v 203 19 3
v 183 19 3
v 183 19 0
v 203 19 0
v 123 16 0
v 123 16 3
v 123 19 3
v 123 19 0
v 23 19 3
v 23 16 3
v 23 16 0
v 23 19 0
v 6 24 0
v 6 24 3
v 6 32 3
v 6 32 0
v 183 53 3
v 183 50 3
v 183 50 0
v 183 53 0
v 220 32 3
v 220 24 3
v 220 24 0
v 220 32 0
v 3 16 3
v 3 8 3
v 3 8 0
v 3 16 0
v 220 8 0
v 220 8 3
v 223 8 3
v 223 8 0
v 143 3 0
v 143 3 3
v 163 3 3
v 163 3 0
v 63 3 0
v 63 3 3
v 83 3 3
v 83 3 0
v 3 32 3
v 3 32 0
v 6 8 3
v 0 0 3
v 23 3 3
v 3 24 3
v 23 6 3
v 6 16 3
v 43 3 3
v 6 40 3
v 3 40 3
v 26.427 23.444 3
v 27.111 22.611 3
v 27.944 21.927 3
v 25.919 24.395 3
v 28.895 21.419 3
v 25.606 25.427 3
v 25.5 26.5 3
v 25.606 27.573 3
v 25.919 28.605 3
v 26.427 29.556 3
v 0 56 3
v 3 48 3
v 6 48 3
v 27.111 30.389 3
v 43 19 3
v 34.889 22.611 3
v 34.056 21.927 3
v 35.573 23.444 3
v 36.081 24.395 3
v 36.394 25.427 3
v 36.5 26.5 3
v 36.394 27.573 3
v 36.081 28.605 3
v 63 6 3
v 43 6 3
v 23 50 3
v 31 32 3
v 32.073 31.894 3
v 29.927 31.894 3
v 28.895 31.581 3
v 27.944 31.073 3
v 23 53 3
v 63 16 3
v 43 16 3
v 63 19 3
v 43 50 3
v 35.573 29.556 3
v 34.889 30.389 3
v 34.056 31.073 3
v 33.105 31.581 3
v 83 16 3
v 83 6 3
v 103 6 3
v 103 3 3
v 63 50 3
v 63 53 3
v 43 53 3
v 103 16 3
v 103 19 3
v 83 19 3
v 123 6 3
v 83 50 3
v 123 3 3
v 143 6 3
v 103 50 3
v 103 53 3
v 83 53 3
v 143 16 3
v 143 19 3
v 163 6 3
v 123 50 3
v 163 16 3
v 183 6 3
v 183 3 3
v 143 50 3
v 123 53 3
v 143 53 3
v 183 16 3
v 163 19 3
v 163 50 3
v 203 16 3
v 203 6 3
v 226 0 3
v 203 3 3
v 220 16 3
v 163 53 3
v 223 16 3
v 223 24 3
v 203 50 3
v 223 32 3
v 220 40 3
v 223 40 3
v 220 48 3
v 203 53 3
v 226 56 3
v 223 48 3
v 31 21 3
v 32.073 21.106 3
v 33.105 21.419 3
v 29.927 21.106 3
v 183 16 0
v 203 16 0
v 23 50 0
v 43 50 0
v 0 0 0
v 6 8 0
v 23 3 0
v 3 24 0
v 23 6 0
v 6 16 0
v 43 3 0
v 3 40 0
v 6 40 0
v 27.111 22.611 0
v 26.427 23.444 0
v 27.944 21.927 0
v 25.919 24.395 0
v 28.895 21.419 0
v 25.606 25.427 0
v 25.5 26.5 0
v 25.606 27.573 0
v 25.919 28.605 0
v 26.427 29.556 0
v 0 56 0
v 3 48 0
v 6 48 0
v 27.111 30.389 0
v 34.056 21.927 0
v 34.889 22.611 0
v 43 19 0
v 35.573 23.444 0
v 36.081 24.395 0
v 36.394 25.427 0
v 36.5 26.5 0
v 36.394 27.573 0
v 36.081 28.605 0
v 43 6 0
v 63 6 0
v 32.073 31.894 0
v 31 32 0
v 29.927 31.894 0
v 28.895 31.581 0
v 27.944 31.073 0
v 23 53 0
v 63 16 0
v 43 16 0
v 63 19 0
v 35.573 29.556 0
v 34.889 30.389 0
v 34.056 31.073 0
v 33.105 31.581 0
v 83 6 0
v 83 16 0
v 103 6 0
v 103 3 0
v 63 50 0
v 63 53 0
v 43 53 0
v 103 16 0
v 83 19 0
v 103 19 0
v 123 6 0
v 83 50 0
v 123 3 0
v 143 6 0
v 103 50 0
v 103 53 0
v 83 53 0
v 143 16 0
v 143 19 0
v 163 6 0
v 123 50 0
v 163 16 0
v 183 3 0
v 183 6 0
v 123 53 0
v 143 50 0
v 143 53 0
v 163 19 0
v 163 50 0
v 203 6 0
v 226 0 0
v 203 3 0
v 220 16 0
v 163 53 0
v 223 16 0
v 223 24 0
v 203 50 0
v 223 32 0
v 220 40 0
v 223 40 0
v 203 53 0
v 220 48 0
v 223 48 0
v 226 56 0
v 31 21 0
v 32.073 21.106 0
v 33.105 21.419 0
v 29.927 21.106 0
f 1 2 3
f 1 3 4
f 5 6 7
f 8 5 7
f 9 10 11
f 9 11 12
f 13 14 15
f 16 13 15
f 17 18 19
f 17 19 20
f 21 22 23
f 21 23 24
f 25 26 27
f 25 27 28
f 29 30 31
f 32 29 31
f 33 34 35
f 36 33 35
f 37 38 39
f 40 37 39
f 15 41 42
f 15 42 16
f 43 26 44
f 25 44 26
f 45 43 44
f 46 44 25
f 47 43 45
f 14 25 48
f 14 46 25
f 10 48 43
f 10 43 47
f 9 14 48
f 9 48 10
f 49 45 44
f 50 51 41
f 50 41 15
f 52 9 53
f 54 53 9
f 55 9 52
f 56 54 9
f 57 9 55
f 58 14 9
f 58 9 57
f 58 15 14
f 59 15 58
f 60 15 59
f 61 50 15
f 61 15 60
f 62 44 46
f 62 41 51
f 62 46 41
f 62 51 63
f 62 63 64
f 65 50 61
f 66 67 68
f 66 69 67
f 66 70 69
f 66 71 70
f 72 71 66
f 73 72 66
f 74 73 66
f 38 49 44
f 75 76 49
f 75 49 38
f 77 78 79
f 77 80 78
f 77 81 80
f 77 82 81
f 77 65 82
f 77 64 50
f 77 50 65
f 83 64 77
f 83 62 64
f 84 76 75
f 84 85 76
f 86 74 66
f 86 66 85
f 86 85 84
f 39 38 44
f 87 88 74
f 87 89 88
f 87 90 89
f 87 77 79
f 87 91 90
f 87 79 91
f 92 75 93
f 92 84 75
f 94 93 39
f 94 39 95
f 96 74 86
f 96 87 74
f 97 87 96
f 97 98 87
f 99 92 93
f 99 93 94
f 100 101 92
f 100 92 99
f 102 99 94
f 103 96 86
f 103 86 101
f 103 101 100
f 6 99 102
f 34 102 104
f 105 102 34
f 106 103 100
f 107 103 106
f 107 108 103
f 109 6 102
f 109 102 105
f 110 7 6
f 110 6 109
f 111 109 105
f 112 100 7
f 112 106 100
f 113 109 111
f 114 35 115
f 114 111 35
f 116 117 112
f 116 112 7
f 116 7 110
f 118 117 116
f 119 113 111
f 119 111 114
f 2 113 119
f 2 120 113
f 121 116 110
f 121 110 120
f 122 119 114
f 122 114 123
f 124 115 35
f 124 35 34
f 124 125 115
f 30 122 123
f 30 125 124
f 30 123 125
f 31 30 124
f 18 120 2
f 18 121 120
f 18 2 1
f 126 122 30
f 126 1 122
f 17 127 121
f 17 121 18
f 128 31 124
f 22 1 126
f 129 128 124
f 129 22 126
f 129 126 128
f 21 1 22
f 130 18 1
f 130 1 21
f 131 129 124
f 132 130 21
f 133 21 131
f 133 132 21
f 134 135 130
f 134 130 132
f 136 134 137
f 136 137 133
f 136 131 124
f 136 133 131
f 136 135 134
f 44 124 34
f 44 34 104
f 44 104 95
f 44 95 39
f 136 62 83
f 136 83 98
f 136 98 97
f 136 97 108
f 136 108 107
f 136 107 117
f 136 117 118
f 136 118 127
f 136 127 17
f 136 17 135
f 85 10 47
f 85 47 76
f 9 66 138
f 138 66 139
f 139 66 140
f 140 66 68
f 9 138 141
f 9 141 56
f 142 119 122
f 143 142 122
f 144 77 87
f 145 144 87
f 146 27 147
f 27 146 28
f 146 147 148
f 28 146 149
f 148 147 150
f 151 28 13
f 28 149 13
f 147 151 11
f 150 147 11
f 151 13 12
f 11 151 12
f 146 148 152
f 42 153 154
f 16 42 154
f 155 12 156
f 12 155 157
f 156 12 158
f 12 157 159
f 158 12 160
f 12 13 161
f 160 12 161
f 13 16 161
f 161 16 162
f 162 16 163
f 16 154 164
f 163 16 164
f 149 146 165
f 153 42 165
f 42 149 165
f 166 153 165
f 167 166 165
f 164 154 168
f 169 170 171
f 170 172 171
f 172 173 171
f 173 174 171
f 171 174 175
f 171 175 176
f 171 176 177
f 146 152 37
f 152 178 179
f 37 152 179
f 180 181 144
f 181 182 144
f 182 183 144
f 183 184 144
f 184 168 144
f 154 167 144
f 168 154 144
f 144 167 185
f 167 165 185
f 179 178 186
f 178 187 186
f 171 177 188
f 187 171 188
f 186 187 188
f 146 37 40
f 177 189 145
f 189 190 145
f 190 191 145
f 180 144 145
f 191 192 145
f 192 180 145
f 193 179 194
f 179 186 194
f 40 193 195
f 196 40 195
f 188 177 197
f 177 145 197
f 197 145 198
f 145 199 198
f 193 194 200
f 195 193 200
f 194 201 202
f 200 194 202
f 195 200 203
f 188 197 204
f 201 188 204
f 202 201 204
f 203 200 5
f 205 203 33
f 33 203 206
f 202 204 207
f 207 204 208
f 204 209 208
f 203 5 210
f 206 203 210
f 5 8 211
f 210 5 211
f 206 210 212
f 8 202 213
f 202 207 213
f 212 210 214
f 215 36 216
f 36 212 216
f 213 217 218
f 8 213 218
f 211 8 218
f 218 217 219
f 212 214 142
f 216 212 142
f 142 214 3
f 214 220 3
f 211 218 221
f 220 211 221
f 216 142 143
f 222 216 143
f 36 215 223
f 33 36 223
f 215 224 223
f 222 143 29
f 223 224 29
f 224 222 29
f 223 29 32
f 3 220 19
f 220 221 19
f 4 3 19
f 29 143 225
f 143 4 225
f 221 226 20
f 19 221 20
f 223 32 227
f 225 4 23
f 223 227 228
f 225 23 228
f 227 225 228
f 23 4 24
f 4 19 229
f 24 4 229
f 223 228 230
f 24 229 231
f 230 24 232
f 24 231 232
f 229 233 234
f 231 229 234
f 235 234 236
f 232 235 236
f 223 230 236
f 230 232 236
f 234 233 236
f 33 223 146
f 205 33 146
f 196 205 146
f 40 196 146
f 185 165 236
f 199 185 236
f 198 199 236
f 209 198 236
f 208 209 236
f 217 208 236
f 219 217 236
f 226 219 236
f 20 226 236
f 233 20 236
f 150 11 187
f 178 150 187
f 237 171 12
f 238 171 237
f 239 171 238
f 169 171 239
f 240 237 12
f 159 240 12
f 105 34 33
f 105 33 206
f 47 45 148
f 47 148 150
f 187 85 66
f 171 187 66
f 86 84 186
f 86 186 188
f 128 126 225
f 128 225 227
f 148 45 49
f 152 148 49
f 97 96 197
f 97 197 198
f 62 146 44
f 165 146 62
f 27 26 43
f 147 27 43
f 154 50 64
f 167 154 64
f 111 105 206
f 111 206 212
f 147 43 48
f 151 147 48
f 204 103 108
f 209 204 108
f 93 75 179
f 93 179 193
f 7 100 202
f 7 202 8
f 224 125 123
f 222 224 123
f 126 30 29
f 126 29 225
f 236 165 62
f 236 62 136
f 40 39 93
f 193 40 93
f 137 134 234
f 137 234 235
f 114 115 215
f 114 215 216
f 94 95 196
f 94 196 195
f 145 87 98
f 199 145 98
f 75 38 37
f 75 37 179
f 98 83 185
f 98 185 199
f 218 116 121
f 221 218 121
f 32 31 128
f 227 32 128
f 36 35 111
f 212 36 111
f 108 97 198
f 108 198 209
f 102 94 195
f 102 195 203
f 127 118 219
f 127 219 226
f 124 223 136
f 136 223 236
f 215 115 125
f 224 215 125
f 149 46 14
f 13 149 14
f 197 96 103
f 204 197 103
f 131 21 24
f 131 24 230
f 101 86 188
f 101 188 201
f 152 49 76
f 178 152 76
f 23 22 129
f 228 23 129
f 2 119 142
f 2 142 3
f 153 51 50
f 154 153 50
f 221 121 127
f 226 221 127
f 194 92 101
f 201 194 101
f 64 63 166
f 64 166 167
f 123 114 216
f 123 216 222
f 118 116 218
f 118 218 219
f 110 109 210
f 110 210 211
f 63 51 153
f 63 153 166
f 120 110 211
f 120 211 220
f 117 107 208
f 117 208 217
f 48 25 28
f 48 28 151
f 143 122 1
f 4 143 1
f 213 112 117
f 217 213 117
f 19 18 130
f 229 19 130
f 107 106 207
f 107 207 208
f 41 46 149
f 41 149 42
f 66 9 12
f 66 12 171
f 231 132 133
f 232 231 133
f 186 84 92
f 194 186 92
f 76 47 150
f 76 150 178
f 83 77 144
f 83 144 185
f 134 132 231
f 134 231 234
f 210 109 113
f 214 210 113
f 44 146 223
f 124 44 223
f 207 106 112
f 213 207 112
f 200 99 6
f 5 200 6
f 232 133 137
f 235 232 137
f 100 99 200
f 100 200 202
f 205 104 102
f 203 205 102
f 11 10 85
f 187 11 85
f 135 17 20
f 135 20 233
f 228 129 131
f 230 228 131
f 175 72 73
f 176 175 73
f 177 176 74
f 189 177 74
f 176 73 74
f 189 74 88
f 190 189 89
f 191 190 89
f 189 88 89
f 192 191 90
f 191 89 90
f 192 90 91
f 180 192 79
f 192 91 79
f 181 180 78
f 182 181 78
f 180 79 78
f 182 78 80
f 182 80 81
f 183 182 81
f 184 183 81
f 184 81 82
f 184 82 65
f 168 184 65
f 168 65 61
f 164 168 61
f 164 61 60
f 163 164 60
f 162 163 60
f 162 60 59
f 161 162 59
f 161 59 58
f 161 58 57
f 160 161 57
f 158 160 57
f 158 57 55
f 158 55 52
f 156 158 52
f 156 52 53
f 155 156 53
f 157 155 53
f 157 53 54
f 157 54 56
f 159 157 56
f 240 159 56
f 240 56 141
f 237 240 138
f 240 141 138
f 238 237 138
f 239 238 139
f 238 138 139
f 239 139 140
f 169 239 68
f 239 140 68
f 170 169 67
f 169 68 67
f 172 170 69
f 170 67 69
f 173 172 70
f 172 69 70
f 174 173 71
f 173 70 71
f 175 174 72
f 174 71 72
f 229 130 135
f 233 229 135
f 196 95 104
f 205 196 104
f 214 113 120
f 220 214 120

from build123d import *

# Parameters (mm, degrees)
SKETCH_W      = 226
SKETCH_H      = 56
PAD_DEPTH     = 3
SKETCH001_R   = 5.5
SKETCH001_W   = 20
SKETCH001_H   = 3
SKETCH001_W_2 = 3
SKETCH001_H_2 = 8
POCKET_DEPTH  = 5


with BuildPart() as part:
    # Sketch → Pad (new body)
    with BuildSketch(Plane.XY):
        with Locations((113, 28)):
            Rectangle(SKETCH_W, SKETCH_H)
    extrude(amount=PAD_DEPTH)

    # Sketch001 (on Face6 of Pad) → Pocket (cut)
    with BuildSketch(Plane.XY.offset(3)):
        with Locations((31, 26.5)):
            Circle(SKETCH001_R)
        with Locations((33, 4.5)):
            Rectangle(SKETCH001_W, SKETCH001_H)
        with Locations((73, 4.5)):
            Rectangle(SKETCH001_W, SKETCH001_H)
        with Locations((113, 4.5)):
            Rectangle(SKETCH001_W, SKETCH001_H)
        with Locations((153, 4.5)):
            Rectangle(SKETCH001_W, SKETCH001_H)
        with Locations((193, 4.5)):
            Rectangle(SKETCH001_W, SKETCH001_H)
        with Locations((33, 17.5)):
            Rectangle(SKETCH001_W, SKETCH001_H)
        with Locations((73, 17.5)):
            Rectangle(SKETCH001_W, SKETCH001_H)
        with Locations((113, 17.5)):
            Rectangle(SKETCH001_W, SKETCH001_H)
        with Locations((153, 17.5)):
            Rectangle(SKETCH001_W, SKETCH001_H)
        with Locations((193, 17.5)):
            Rectangle(SKETCH001_W, SKETCH001_H)
        with Locations((33, 51.5)):
            Rectangle(SKETCH001_W, SKETCH001_H)
        with Locations((73, 51.5)):
            Rectangle(SKETCH001_W, SKETCH001_H)
        with Locations((113, 51.5)):
            Rectangle(SKETCH001_W, SKETCH001_H)
        with Locations((153, 51.5)):
            Rectangle(SKETCH001_W, SKETCH001_H)
        with Locations((193, 51.5)):
            Rectangle(SKETCH001_W, SKETCH001_H)
        with Locations((4.5, 12)):
            Rectangle(SKETCH001_W_2, SKETCH001_H_2)
        with Locations((4.5, 28)):
            Rectangle(SKETCH001_W_2, SKETCH001_H_2)
        with Locations((4.5, 44)):
            Rectangle(SKETCH001_W_2, SKETCH001_H_2)
        with Locations((221.5, 12)):
            Rectangle(SKETCH001_W_2, SKETCH001_H_2)
        with Locations((221.5, 28)):
            Rectangle(SKETCH001_W_2, SKETCH001_H_2)
        with Locations((221.5, 44)):
            Rectangle(SKETCH001_W_2, SKETCH001_H_2)
    extrude(amount=-POCKET_DEPTH, mode=Mode.SUBTRACT)


solid = part.part
